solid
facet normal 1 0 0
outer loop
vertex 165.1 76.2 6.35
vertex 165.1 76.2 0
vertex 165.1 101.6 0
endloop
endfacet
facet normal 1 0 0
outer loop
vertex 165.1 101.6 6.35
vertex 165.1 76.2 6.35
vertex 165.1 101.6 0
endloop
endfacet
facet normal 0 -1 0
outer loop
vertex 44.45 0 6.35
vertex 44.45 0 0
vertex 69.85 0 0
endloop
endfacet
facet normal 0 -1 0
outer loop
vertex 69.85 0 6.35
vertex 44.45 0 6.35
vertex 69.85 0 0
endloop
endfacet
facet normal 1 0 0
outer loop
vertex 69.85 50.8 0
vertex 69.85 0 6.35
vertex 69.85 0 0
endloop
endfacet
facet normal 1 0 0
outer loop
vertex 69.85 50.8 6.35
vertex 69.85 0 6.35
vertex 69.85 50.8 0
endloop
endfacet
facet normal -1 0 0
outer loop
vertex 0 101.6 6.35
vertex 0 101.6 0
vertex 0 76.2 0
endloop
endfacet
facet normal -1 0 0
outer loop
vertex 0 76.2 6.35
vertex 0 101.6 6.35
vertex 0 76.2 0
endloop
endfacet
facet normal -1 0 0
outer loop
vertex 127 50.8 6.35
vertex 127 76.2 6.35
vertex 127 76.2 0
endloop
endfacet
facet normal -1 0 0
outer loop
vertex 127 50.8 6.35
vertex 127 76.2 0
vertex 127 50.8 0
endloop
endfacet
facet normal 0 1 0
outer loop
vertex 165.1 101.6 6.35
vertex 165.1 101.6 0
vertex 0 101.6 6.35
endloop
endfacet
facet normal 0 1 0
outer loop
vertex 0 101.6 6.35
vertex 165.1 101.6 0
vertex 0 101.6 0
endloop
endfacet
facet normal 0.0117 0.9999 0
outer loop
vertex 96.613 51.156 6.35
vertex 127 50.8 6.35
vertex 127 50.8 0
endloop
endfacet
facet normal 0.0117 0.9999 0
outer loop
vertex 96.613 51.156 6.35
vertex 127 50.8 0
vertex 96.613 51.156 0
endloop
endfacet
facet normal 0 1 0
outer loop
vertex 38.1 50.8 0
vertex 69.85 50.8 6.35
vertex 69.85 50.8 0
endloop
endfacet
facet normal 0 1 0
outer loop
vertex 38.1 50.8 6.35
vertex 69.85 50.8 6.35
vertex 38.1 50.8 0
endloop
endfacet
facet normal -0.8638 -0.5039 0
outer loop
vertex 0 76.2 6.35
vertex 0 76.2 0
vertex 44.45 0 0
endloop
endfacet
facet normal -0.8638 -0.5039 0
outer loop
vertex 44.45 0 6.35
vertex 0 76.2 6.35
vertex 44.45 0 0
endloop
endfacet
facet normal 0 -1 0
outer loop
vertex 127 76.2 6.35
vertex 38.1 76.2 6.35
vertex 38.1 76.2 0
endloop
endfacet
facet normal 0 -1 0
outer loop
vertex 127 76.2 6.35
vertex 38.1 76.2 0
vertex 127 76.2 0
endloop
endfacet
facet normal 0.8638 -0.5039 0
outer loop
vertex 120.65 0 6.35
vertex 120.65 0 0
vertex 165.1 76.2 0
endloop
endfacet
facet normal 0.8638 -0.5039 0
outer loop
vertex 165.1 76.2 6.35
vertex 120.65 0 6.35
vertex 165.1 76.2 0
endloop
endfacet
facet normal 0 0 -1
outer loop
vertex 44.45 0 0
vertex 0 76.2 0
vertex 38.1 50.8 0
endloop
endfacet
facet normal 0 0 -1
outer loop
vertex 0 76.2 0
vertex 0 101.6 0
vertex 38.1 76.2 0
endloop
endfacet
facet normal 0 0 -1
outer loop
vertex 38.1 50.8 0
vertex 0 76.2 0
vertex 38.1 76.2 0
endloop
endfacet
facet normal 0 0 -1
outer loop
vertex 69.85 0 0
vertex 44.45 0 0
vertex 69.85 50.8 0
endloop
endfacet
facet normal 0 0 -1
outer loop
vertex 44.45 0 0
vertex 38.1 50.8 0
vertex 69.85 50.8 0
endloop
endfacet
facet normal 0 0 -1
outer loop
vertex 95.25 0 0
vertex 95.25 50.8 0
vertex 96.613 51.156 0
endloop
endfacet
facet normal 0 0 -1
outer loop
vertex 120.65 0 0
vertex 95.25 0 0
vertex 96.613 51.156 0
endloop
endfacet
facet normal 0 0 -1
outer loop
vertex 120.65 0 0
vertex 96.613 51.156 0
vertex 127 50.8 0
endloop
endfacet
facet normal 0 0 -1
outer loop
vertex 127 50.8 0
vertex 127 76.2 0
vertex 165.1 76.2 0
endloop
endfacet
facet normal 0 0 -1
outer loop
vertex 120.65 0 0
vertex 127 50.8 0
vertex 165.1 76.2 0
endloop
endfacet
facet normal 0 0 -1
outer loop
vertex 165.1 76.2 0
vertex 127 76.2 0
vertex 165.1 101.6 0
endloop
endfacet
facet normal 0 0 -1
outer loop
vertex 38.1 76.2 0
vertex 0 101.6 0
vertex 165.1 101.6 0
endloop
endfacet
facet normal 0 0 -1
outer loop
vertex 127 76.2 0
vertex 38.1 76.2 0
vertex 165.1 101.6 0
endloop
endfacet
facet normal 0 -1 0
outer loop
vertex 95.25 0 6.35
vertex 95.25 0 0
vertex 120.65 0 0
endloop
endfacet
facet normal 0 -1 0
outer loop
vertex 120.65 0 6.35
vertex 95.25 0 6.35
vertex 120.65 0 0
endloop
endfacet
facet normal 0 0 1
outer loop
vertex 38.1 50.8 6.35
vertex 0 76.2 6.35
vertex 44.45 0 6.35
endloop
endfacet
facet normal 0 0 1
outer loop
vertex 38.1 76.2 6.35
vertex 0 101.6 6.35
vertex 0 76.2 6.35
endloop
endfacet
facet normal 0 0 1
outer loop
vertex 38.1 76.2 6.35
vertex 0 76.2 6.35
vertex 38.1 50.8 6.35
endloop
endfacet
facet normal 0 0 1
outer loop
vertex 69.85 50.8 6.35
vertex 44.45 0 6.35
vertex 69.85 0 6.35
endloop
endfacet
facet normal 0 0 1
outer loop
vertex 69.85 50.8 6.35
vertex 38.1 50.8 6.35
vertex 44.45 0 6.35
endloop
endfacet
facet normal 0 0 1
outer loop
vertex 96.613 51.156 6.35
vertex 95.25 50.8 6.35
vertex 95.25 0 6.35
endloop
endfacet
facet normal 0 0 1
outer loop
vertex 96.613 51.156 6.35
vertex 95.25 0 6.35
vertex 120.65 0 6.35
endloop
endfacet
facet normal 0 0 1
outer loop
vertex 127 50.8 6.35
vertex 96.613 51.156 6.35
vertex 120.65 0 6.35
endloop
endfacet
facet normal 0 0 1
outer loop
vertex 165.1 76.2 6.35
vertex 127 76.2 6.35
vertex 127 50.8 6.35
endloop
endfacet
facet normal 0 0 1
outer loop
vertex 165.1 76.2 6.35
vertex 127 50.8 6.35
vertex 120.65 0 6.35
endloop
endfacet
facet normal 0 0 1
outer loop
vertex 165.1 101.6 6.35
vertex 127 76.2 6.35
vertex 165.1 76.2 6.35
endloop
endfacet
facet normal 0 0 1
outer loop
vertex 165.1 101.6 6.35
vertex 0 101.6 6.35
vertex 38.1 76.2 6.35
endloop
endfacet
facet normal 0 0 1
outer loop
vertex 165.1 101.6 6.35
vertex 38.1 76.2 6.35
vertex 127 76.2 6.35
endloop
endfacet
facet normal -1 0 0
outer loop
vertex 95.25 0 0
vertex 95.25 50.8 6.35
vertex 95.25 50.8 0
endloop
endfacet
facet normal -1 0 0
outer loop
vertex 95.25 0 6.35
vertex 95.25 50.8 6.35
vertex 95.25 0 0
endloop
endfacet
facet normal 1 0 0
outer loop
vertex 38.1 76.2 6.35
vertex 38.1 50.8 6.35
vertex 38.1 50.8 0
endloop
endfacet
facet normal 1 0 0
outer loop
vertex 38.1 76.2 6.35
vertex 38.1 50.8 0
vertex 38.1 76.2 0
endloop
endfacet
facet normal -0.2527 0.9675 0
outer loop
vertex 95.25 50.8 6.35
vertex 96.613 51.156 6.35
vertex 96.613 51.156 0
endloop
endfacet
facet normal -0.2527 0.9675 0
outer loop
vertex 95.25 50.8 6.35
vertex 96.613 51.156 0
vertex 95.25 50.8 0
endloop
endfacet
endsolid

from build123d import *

# Parameters (mm, degrees)
BOSS_EXTRUDE1_DEPTH = 6.35
CUT_EXTRUDE1_DEPTH  = 6.35


with BuildPart() as part:
    # Sketch1 → Boss-Extrude1 (new body)
    with BuildSketch(Plane.XY):
        Polygon((0, 101.6), (0, 76.2), (44.45, 0), (120.65, 0), (165.1, 76.2), (165.1, 101.6), align=None)
    extrude(amount=BOSS_EXTRUDE1_DEPTH)

    # Sketch2 → Cut-Extrude1 (cut)
    with BuildSketch(Plane.XY.offset(6.35)):
        Polygon((38.1, 76.2), (127, 76.2), (127, 50.8), (96.613225755, 51.156306651), (95.25, 50.8), (95.25, 0), (69.85, 0), (69.85, 50.8), (38.1, 50.8), align=None)
    extrude(amount=-CUT_EXTRUDE1_DEPTH, mode=Mode.SUBTRACT)


solid = part.part
